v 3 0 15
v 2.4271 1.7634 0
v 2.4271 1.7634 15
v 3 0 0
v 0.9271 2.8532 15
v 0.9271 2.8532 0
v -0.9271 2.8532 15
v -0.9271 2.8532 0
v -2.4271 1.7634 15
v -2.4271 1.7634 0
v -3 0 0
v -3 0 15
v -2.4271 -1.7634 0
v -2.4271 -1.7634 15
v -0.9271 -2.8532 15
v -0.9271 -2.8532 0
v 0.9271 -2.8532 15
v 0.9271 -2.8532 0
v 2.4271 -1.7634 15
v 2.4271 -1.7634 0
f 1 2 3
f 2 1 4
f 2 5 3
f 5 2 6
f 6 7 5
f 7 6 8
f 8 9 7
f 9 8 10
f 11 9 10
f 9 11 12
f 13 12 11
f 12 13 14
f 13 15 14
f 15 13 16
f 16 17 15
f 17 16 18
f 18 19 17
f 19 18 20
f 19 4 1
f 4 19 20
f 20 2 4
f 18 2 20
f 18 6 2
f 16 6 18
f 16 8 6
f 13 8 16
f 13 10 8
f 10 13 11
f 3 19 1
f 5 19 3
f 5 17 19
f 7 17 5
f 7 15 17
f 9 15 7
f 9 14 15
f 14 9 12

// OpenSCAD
// Generated by SolidPython 1.0.1 on 2020-07-29 00:46:44


cylinder(h = 15, r1 = 3, r2 = 3);
/***********************************************
*********      SolidPython code:      **********
************************************************
 
# import packages: SolidPython
from solid import *
from solid.utils import *
from itertools import chain, combinations, permutations


class Resize:

    def __init__(self, scad_file):
        self.scad_file = scad_file
        #self.scad_file = import_scad(scad_file)
        # cone/cylinder param:
        self.r1 = 0
        self.r2 = 0
        self.h = 0
        # rectangular prism param:
        self.w = 0
        self.l = 0
        # ellipse param:
        self.r = 0

    # import OpenScad code (file name corresponds to shape)


    # classify shape + parameters
    def assign(self, param1, param2, param3):
        if self.scad_file == 'cone.scad':
            self.r1 = param1
            self.r2 = param2
            self.h = param3
        elif self.scad_file == 'cylinder.scad':
            self.r1 = param1
            self.r2 = param2
            self.h = param3
        elif self.scad_file == 'rectangularPrism.scad':
            self.h = param1
            self.l = param2
            self.w = param3
        else:
            self.r = param1
            self.h = param2

    # resize parameters
    def iterate(self):
        x = range(3, 20, 2)
        i = 1
        if self.scad_file == 'cone.scad':
            tempList = list(permutations(x, 2))
            for temp in tempList:
                param1 = temp[0]
                param2 = temp[1]
                filepath = 'produced_scad_files/' + 'cone' + str(param1) + '_' + str(param2) + '_' + '.scad'
                scad_render_to_file(cylinder(h=param1, r1=param2, r2=0), filepath)

        elif self.scad_file == 'cylinder.scad':
            tempList = list(permutations(x, 3))
            for temp in tempList:
                param1 = temp[0]
                param2 = temp[1]
                filepath = 'produced_scad_files/' + 'cylinder' + str(param1) + '_' + str(param2) + '_' + '.scad'
                scad_render_to_file(cylinder(h=param1, r1=param2, r2=param2), filepath)

        elif self.scad_file == 'rectangularPrism.scad':
            tempList = list(permutations(x, 3))
            for temp in tempList:
                param1 = temp[0]
                param2 = temp[1]
                param3 = temp[2]
                filepath = 'produced_scad_files/' + 'rectangularPrism' + str(param1) + '_' + str(param2) + '_' + str(
                    param3) + '.scad'
                scad_render_to_file(cube(size=(param1, param2, param3)), filepath)

        elif self.scad_file == 'ellipse.scad':
            tempList = list(permutations(x, 4))
            for temp in tempList:
                param1 = temp[0]
                param2 = temp[1]
                param3 = temp[2]
                param4 = temp[3]
                filepath = 'produced_scad_files/' + 'ellipse' + str(param1) + '_' + str(param2) + '_' + str(param3) + '_' + str(param4) + '.scad'
                scad_render_to_file(scale([param1, param2, param3])(sphere(r=param4)), filepath)

    def render_to_scadfile(self):
        scad_render_to_file(scad, 'example.scad') 
 
************************************************/
